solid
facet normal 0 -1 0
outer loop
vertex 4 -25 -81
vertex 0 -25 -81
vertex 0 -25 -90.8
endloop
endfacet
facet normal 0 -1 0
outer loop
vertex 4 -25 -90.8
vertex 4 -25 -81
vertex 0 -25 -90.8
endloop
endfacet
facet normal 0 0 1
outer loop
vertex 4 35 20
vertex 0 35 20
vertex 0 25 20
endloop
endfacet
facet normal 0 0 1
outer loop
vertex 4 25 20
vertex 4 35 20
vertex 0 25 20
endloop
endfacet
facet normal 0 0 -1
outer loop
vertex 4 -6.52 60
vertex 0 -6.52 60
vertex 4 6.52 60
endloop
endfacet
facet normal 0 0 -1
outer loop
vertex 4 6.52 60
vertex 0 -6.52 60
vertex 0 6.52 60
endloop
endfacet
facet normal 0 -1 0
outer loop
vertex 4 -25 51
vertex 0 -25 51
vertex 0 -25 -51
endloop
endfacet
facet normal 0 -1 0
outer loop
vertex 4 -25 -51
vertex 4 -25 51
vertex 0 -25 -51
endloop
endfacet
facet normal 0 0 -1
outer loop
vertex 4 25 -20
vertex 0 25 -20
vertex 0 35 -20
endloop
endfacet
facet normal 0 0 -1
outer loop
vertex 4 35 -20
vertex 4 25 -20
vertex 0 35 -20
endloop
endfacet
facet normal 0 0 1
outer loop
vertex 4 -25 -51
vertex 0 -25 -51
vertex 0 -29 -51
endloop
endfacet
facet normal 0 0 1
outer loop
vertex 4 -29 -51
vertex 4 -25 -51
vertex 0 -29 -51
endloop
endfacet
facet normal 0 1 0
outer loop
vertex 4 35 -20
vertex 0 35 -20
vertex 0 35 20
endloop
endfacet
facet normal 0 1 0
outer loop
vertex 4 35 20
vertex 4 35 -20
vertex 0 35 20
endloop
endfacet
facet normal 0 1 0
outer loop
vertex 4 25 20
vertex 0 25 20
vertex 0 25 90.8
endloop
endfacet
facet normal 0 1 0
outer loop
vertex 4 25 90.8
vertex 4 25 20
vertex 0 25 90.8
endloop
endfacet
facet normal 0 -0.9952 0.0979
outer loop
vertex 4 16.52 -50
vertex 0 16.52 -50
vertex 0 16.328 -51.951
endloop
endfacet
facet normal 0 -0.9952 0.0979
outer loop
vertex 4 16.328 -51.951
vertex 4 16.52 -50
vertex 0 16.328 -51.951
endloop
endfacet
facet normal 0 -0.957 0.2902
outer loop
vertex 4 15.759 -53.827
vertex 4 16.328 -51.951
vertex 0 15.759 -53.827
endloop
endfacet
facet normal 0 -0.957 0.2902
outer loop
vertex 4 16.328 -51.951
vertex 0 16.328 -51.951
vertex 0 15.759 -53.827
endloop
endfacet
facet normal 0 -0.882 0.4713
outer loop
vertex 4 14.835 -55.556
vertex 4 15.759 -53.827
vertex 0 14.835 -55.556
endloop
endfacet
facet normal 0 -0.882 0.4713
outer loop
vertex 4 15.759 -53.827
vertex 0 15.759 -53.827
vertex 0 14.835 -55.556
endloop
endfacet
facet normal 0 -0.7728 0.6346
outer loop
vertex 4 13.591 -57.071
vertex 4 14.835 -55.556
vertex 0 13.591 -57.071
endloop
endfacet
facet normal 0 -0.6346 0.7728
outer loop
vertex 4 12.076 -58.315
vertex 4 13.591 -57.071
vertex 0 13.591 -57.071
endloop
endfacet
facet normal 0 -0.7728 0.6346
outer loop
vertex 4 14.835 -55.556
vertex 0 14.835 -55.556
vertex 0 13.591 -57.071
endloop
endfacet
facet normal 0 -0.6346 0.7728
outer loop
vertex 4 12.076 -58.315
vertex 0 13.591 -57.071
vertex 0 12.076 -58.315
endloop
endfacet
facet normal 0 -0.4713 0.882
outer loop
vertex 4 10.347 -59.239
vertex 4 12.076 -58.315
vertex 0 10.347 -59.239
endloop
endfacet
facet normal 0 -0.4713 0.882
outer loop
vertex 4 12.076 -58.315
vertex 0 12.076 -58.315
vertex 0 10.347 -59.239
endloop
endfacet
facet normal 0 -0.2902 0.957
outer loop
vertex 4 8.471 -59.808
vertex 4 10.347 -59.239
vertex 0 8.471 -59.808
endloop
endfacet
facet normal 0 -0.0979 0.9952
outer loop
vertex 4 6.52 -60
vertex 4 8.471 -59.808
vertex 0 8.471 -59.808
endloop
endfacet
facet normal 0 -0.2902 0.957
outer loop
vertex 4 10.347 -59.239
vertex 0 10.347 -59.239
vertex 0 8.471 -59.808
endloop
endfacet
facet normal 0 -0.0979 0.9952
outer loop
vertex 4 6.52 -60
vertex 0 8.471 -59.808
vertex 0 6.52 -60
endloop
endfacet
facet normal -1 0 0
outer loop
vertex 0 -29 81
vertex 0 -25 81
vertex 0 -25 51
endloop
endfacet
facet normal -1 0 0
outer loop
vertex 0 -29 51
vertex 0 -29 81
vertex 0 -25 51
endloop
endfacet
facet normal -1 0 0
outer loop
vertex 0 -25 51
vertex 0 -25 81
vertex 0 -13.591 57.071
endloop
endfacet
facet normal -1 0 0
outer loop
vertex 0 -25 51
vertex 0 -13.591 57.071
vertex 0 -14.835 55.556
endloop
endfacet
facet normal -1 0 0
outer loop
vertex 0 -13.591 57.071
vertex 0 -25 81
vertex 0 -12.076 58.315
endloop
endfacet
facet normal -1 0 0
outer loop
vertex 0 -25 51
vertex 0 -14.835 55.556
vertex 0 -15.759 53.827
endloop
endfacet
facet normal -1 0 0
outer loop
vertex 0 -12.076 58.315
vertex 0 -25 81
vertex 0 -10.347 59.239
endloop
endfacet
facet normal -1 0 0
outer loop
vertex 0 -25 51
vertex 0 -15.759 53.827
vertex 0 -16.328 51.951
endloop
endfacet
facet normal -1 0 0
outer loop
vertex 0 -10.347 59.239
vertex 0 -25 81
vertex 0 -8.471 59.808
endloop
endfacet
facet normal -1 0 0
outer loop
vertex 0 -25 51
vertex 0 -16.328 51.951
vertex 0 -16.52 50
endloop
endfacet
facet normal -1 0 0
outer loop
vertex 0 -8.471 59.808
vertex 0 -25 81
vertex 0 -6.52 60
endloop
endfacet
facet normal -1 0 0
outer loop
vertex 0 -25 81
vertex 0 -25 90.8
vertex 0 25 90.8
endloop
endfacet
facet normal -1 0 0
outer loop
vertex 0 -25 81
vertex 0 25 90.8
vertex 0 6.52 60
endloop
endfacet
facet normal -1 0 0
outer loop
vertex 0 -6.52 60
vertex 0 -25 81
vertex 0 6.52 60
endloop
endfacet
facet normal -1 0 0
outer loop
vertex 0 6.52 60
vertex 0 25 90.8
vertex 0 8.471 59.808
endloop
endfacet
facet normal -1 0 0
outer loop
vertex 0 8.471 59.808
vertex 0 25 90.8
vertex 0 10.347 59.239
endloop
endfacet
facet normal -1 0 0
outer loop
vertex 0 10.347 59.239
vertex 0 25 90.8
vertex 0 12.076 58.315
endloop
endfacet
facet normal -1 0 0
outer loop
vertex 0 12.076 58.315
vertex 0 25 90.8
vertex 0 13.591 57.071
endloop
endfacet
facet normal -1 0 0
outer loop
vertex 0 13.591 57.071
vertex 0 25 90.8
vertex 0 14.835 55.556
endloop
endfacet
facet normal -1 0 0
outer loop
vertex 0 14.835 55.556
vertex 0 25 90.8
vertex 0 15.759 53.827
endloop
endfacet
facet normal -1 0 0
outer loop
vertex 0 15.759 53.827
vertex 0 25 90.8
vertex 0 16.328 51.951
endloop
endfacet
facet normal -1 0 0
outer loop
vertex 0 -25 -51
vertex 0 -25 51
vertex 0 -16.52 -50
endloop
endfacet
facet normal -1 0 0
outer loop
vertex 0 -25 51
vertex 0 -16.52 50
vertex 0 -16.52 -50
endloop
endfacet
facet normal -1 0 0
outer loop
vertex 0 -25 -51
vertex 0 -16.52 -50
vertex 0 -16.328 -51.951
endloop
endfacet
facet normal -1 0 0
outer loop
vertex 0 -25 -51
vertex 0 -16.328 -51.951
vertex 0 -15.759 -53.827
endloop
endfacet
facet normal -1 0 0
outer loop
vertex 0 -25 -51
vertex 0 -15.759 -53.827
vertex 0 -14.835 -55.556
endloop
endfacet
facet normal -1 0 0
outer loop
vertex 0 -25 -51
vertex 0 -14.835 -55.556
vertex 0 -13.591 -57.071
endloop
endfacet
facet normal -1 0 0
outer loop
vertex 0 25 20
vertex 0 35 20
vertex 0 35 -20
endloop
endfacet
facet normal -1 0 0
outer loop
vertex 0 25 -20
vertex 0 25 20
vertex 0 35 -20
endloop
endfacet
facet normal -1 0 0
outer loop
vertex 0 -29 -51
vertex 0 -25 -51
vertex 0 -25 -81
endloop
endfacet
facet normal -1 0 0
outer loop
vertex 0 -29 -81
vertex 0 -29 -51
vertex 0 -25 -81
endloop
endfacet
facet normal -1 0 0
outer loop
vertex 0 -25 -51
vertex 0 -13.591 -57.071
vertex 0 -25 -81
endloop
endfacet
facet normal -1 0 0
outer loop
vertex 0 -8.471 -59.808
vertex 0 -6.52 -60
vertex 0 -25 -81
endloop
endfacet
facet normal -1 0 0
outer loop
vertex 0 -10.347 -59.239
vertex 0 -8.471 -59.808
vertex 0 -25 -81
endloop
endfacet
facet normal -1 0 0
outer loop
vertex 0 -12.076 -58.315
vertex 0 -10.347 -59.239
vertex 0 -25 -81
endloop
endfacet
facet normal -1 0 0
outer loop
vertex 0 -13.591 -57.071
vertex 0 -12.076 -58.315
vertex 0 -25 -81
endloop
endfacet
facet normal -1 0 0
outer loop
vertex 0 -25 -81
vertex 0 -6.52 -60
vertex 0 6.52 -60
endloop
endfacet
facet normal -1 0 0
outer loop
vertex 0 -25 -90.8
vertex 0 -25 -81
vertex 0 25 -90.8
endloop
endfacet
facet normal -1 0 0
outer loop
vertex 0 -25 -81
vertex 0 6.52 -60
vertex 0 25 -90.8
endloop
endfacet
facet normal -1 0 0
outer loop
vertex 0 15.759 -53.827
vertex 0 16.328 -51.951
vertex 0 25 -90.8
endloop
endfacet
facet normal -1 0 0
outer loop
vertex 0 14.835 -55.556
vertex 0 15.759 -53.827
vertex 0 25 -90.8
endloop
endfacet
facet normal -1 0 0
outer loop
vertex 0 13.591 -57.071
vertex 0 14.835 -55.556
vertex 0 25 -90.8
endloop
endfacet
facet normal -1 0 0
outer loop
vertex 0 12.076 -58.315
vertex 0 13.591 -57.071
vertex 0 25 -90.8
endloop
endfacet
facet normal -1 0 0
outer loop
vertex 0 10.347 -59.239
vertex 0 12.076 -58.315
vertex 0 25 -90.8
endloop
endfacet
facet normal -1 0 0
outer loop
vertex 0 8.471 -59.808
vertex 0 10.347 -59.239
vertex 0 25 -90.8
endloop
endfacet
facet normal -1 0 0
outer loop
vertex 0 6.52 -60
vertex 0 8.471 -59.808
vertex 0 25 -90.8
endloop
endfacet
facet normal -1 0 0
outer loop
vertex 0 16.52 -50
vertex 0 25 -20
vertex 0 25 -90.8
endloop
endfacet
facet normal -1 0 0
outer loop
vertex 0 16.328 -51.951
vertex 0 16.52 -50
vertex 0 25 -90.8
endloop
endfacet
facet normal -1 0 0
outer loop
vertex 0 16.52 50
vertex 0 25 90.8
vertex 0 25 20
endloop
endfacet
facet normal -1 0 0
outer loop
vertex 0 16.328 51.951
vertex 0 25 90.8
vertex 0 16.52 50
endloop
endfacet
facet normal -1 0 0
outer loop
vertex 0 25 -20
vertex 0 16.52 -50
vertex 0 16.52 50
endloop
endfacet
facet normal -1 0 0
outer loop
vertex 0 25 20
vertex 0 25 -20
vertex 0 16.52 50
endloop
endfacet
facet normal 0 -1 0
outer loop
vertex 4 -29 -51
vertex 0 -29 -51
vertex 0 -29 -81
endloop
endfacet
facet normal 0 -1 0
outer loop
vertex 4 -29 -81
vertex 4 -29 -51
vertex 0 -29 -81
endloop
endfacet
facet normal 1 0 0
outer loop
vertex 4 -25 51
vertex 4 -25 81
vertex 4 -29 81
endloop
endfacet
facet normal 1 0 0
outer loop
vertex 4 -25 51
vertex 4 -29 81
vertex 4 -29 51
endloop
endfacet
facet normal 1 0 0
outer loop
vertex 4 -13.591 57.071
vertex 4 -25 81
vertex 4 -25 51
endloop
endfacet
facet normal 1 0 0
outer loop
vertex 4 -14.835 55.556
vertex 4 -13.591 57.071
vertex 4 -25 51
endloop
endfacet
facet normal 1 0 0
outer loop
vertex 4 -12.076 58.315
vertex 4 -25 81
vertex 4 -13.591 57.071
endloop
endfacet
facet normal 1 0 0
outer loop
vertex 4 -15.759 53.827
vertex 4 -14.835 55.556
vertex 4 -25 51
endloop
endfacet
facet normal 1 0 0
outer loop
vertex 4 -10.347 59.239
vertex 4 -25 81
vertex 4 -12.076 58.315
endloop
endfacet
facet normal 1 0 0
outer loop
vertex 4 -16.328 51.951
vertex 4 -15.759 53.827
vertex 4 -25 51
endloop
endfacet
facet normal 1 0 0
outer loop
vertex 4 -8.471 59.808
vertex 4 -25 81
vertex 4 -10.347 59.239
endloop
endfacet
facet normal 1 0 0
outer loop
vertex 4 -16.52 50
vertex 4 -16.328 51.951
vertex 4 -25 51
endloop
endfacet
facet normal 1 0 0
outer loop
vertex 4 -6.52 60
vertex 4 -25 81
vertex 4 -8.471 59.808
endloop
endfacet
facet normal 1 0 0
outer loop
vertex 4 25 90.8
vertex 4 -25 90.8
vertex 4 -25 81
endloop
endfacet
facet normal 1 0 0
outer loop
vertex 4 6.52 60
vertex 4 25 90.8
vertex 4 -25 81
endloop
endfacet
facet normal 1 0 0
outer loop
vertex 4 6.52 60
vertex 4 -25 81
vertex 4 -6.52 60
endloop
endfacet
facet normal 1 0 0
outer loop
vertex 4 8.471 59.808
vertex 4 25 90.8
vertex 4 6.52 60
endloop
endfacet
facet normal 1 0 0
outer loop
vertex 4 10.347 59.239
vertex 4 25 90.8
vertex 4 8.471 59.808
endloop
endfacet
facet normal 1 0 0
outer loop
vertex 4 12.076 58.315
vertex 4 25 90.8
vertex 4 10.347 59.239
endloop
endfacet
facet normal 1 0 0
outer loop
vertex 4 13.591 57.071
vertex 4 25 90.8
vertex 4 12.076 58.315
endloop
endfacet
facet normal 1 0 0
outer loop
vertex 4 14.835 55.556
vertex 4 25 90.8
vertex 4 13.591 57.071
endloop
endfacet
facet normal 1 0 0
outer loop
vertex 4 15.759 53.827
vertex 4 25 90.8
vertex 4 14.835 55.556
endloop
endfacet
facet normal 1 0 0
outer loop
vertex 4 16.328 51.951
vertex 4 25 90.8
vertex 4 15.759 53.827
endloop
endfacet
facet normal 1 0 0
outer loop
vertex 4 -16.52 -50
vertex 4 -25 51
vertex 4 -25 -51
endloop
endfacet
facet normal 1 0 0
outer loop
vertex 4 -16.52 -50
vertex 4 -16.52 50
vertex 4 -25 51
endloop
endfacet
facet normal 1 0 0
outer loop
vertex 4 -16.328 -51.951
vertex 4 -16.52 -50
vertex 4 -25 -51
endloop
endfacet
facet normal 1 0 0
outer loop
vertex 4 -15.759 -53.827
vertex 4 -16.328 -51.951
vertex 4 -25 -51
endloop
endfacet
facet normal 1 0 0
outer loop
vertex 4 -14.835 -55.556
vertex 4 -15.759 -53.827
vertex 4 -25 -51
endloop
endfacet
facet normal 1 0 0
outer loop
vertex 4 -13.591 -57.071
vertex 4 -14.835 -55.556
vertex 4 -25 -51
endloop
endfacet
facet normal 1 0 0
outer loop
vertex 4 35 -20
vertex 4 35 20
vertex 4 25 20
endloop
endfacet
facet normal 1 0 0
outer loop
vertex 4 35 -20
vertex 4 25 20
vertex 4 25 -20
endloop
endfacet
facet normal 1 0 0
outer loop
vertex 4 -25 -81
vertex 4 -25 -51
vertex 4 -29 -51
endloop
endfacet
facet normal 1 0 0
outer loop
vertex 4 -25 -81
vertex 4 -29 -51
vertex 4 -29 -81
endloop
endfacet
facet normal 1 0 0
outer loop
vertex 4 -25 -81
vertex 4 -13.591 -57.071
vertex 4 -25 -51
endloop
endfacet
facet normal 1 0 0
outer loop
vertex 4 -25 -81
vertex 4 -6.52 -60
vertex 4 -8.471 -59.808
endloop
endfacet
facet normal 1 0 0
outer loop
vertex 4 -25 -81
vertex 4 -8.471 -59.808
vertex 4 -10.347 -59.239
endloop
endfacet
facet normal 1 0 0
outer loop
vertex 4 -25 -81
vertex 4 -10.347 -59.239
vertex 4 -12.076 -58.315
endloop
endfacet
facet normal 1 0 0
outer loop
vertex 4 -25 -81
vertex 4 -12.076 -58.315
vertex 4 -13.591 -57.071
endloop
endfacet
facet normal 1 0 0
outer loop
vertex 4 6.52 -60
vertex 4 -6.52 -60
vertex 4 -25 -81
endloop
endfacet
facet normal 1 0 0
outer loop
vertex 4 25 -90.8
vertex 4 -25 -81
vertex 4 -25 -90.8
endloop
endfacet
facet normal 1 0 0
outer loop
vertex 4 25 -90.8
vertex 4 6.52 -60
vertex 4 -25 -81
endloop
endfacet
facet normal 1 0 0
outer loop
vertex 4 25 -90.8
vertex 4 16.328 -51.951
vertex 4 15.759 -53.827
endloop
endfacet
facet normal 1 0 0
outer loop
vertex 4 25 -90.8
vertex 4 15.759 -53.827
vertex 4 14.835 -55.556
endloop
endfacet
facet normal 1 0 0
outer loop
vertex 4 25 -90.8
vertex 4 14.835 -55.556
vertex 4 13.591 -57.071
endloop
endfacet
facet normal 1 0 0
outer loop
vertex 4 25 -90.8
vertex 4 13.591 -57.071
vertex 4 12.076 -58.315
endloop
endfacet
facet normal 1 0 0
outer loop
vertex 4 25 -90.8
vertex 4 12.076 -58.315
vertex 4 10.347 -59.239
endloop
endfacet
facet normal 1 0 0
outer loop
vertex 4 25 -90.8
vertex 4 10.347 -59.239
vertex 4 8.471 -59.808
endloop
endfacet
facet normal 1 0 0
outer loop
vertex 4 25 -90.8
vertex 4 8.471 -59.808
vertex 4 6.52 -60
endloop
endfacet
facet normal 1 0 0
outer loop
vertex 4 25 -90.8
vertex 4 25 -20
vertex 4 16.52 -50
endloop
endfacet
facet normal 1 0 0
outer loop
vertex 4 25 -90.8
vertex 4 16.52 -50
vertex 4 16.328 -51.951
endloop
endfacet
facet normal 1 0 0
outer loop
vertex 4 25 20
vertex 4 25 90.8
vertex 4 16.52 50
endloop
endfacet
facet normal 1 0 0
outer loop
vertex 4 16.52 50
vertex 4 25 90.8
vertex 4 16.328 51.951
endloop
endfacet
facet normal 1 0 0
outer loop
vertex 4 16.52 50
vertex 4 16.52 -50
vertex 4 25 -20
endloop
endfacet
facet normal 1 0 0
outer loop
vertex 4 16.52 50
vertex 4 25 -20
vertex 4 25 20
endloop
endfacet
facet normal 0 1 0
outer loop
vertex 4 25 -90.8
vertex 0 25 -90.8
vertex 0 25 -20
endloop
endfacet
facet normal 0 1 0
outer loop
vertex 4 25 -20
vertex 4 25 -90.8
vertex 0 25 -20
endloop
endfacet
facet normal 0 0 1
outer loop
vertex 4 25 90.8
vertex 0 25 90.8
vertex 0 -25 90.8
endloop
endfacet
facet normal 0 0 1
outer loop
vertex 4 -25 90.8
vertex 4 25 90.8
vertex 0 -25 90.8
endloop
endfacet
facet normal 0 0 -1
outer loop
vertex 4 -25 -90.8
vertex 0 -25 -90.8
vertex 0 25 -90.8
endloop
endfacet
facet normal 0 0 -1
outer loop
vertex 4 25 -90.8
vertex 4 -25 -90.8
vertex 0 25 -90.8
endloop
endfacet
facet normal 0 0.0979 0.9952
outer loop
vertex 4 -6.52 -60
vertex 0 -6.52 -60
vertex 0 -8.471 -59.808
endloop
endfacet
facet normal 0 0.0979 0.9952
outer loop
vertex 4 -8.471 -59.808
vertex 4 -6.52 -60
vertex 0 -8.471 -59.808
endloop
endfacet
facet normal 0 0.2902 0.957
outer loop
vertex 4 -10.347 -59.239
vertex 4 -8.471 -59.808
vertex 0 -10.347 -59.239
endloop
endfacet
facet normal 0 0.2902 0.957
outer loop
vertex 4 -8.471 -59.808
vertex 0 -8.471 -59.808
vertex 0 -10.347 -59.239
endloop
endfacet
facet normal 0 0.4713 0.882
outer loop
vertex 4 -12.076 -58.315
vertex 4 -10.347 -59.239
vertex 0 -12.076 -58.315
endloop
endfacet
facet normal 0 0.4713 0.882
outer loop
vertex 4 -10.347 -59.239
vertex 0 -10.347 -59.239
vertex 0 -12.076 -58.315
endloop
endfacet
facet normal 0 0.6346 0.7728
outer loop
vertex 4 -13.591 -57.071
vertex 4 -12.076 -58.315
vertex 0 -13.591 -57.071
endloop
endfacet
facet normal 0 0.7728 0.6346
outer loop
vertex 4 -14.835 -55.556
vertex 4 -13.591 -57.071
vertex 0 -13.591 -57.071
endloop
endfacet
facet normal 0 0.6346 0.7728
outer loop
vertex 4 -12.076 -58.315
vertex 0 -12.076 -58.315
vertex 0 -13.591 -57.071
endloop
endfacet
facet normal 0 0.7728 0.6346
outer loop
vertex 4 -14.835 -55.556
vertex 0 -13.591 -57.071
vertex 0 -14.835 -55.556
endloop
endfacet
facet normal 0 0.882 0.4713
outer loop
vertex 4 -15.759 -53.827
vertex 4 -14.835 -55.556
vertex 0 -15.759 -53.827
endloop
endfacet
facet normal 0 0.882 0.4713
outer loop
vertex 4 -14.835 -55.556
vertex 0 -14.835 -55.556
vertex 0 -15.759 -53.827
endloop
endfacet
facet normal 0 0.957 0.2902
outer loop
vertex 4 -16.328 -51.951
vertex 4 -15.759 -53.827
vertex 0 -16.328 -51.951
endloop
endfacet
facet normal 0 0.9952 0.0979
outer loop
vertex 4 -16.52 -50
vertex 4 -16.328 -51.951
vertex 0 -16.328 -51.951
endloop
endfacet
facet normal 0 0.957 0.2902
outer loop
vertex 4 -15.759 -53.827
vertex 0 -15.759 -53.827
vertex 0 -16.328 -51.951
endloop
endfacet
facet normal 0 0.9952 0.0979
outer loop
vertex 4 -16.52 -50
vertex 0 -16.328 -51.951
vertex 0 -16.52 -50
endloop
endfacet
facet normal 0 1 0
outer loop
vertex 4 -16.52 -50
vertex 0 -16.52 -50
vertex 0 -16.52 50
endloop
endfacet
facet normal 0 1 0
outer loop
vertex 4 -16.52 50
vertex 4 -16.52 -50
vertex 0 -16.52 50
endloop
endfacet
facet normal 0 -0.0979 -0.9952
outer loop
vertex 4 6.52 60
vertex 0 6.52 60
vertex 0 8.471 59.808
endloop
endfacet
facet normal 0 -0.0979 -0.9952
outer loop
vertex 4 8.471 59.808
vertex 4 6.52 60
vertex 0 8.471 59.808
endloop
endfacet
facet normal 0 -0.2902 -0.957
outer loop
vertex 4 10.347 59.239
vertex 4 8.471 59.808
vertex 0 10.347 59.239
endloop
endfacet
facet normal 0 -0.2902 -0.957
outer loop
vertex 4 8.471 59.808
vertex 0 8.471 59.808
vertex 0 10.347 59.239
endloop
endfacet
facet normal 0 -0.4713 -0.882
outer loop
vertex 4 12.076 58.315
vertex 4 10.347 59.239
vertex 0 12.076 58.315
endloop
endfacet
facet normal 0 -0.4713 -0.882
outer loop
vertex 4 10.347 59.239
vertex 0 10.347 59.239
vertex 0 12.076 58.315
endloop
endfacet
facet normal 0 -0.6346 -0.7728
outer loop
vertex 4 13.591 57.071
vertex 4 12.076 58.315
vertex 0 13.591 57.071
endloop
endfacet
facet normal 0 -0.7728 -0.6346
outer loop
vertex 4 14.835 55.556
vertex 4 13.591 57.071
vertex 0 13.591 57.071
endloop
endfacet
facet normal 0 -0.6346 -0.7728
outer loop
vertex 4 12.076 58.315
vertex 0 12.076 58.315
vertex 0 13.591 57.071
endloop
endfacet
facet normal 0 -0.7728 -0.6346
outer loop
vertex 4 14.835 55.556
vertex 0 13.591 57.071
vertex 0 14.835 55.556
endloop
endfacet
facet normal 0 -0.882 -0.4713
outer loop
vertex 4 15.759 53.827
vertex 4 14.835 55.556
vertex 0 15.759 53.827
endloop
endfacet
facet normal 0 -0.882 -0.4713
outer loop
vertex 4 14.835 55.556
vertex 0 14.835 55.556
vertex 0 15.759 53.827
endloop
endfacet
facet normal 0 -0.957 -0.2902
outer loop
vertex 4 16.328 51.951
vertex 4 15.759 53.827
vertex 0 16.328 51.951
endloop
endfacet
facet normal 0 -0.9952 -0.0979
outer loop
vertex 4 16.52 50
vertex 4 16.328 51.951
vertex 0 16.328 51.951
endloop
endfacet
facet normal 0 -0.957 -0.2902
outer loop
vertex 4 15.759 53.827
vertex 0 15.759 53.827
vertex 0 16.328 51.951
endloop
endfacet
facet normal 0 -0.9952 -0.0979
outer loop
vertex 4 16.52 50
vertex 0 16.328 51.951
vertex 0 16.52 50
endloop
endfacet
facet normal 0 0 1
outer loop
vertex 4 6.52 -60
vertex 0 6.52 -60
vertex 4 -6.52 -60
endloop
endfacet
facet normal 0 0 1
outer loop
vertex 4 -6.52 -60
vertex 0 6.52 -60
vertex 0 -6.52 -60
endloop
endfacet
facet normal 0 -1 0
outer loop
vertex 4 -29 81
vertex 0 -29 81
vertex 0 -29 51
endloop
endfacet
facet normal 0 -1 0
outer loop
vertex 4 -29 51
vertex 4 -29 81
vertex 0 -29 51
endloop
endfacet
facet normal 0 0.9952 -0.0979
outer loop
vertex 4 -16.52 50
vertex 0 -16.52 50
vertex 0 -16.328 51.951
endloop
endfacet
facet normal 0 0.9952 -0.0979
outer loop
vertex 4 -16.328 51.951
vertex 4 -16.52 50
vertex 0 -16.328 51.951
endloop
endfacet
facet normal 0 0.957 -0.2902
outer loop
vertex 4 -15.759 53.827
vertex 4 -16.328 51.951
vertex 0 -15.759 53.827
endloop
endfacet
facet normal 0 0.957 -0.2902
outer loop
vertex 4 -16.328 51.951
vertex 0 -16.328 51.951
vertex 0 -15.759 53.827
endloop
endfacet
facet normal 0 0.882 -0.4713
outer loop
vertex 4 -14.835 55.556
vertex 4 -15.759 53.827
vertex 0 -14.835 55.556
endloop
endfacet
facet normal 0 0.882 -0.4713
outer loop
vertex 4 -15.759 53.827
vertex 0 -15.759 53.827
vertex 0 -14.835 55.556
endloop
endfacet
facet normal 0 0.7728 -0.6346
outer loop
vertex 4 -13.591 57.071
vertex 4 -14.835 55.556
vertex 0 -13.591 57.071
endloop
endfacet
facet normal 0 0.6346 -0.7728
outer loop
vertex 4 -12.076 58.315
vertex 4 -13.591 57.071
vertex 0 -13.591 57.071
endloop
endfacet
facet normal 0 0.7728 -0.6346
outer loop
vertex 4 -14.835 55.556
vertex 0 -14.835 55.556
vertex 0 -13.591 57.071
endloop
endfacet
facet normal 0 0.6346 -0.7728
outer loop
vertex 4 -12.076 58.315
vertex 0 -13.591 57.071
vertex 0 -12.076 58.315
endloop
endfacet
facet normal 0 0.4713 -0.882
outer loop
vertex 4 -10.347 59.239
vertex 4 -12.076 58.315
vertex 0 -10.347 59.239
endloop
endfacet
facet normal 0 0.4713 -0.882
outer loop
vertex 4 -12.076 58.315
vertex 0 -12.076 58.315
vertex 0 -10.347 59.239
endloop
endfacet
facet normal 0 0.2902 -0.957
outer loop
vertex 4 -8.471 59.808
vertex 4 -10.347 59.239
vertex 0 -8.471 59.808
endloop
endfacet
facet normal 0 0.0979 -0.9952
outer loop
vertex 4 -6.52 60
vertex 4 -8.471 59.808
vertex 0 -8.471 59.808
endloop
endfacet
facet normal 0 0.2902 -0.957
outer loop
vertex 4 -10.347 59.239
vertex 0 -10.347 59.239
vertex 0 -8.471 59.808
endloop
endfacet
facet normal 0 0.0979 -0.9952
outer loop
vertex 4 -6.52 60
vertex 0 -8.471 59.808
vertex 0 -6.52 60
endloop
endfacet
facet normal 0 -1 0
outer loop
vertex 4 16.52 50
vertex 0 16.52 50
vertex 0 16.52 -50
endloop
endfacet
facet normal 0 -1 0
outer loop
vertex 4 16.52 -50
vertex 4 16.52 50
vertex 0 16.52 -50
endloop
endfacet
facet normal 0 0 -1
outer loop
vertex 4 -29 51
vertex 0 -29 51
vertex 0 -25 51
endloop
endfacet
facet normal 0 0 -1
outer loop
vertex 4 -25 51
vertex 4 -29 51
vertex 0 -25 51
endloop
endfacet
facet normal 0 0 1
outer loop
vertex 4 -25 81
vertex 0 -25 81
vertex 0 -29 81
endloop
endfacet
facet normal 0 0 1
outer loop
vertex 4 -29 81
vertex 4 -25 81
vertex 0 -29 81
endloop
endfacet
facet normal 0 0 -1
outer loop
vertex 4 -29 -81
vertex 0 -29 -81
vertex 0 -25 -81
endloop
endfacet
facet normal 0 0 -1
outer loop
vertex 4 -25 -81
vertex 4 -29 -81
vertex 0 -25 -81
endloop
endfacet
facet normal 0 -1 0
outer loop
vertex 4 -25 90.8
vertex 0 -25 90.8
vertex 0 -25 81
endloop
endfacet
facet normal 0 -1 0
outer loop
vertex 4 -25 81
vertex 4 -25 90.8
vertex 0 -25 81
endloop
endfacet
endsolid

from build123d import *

# Parameters (mm, degrees)
SALIENTE_EXTRUIR1_DEPTH = 4


with BuildPart() as part:
    # Croquis1 → Saliente-Extruir1 (new body)
    with BuildSketch(Plane(origin=(0, 0, 0), x_dir=(0, 0, -1), z_dir=(1, 0, 0))):
        Polygon((-81, -25), (-81, -29), (-51, -29), (-51, -25), (51, -25), (51, -29), (81, -29), (81, -25), (90.8, -25), (90.8, 25), (20, 25), (20, 35), (-20, 35), (-20, 25), (-90.8, 25), (-90.8, -25), align=None)
        with BuildLine():
            Line((-50, 16.519823789), (50, 16.519823789))
            ThreePointArc((50, 16.519823789), (57.071067812, 13.5908916), (60, 6.519823789))
            Line((60, 6.519823789), (60, -6.519823789))
            ThreePointArc((60, -6.519823789), (57.071067812, -13.5908916), (50, -16.519823789))
            Line((50, -16.519823789), (-50, -16.519823789))
            ThreePointArc((-50, -16.519823789), (-57.071067812, -13.5908916), (-60, -6.519823789))
            Line((-60, -6.519823789), (-60, 6.519823789))
            ThreePointArc((-60, 6.519823789), (-57.071067812, 13.5908916), (-50, 16.519823789))
        make_face(mode=Mode.SUBTRACT)
    extrude(amount=SALIENTE_EXTRUIR1_DEPTH)


solid = part.part
